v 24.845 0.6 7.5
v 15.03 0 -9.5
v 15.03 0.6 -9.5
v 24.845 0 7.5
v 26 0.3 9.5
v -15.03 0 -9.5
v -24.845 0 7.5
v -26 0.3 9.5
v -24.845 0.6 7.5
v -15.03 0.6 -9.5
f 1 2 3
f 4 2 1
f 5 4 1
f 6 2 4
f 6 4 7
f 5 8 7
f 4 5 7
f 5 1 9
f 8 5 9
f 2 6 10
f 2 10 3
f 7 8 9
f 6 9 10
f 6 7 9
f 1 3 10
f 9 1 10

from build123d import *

# Parameters (mm, degrees)
BOSS_EXTRUDE1_DEPTH = 0.6
CHAMFER1_SIZE       = 0.3
CHAMFER1_SIZE2      = 2
CHAMFER2_SIZE       = 0.3
CHAMFER2_SIZE_2     = 2


with BuildPart() as part:
    # Sketch1 → Boss-Extrude1 (new body)
    with BuildSketch(Plane(origin=(0, 0, 0), x_dir=(1, 0, 0), z_dir=(0, 1, 0))):
        Polygon((-15.030344885, 9.5), (15.030344885, 9.5), (26, -9.5), (-26, -9.5), align=None)
    extrude(amount=BOSS_EXTRUDE1_DEPTH)

    # Chamfer1
    chamfer1_edges = [part.edges().sort_by_distance(p)[0] for p in [
        (0, 0.6, 9.5),
    ]]
    chamfer1_side = [part.faces().sort_by_distance(p)[0] for p in [
        (0, 0.3, 9.5),
    ]]
    chamfer(chamfer1_edges, length=CHAMFER1_SIZE, length2=CHAMFER1_SIZE2, reference=chamfer1_side[0])

    # Chamfer2
    # the kernel refuses this chamfer: 2, 0.3 mm, written as the material it takes off along each edge
    with BuildSketch(Plane(origin=(31.19787194, 0, 9.5), x_dir=(0, 0.9692970769593504, 0.24589261192247985), z_dir=(-1, 0, 0))) as chamfer2_piece_1:
        Polygon((CHAMFER2_SIZE * 0.969297076959, CHAMFER2_SIZE * 0.245892611922), (-CHAMFER2_SIZE_2 * 0.245892611922, CHAMFER2_SIZE_2 * 0.969297076959), (0, 0), align=None)
    extrude(amount=62.39574388, mode=Mode.SUBTRACT)


solid = part.part
